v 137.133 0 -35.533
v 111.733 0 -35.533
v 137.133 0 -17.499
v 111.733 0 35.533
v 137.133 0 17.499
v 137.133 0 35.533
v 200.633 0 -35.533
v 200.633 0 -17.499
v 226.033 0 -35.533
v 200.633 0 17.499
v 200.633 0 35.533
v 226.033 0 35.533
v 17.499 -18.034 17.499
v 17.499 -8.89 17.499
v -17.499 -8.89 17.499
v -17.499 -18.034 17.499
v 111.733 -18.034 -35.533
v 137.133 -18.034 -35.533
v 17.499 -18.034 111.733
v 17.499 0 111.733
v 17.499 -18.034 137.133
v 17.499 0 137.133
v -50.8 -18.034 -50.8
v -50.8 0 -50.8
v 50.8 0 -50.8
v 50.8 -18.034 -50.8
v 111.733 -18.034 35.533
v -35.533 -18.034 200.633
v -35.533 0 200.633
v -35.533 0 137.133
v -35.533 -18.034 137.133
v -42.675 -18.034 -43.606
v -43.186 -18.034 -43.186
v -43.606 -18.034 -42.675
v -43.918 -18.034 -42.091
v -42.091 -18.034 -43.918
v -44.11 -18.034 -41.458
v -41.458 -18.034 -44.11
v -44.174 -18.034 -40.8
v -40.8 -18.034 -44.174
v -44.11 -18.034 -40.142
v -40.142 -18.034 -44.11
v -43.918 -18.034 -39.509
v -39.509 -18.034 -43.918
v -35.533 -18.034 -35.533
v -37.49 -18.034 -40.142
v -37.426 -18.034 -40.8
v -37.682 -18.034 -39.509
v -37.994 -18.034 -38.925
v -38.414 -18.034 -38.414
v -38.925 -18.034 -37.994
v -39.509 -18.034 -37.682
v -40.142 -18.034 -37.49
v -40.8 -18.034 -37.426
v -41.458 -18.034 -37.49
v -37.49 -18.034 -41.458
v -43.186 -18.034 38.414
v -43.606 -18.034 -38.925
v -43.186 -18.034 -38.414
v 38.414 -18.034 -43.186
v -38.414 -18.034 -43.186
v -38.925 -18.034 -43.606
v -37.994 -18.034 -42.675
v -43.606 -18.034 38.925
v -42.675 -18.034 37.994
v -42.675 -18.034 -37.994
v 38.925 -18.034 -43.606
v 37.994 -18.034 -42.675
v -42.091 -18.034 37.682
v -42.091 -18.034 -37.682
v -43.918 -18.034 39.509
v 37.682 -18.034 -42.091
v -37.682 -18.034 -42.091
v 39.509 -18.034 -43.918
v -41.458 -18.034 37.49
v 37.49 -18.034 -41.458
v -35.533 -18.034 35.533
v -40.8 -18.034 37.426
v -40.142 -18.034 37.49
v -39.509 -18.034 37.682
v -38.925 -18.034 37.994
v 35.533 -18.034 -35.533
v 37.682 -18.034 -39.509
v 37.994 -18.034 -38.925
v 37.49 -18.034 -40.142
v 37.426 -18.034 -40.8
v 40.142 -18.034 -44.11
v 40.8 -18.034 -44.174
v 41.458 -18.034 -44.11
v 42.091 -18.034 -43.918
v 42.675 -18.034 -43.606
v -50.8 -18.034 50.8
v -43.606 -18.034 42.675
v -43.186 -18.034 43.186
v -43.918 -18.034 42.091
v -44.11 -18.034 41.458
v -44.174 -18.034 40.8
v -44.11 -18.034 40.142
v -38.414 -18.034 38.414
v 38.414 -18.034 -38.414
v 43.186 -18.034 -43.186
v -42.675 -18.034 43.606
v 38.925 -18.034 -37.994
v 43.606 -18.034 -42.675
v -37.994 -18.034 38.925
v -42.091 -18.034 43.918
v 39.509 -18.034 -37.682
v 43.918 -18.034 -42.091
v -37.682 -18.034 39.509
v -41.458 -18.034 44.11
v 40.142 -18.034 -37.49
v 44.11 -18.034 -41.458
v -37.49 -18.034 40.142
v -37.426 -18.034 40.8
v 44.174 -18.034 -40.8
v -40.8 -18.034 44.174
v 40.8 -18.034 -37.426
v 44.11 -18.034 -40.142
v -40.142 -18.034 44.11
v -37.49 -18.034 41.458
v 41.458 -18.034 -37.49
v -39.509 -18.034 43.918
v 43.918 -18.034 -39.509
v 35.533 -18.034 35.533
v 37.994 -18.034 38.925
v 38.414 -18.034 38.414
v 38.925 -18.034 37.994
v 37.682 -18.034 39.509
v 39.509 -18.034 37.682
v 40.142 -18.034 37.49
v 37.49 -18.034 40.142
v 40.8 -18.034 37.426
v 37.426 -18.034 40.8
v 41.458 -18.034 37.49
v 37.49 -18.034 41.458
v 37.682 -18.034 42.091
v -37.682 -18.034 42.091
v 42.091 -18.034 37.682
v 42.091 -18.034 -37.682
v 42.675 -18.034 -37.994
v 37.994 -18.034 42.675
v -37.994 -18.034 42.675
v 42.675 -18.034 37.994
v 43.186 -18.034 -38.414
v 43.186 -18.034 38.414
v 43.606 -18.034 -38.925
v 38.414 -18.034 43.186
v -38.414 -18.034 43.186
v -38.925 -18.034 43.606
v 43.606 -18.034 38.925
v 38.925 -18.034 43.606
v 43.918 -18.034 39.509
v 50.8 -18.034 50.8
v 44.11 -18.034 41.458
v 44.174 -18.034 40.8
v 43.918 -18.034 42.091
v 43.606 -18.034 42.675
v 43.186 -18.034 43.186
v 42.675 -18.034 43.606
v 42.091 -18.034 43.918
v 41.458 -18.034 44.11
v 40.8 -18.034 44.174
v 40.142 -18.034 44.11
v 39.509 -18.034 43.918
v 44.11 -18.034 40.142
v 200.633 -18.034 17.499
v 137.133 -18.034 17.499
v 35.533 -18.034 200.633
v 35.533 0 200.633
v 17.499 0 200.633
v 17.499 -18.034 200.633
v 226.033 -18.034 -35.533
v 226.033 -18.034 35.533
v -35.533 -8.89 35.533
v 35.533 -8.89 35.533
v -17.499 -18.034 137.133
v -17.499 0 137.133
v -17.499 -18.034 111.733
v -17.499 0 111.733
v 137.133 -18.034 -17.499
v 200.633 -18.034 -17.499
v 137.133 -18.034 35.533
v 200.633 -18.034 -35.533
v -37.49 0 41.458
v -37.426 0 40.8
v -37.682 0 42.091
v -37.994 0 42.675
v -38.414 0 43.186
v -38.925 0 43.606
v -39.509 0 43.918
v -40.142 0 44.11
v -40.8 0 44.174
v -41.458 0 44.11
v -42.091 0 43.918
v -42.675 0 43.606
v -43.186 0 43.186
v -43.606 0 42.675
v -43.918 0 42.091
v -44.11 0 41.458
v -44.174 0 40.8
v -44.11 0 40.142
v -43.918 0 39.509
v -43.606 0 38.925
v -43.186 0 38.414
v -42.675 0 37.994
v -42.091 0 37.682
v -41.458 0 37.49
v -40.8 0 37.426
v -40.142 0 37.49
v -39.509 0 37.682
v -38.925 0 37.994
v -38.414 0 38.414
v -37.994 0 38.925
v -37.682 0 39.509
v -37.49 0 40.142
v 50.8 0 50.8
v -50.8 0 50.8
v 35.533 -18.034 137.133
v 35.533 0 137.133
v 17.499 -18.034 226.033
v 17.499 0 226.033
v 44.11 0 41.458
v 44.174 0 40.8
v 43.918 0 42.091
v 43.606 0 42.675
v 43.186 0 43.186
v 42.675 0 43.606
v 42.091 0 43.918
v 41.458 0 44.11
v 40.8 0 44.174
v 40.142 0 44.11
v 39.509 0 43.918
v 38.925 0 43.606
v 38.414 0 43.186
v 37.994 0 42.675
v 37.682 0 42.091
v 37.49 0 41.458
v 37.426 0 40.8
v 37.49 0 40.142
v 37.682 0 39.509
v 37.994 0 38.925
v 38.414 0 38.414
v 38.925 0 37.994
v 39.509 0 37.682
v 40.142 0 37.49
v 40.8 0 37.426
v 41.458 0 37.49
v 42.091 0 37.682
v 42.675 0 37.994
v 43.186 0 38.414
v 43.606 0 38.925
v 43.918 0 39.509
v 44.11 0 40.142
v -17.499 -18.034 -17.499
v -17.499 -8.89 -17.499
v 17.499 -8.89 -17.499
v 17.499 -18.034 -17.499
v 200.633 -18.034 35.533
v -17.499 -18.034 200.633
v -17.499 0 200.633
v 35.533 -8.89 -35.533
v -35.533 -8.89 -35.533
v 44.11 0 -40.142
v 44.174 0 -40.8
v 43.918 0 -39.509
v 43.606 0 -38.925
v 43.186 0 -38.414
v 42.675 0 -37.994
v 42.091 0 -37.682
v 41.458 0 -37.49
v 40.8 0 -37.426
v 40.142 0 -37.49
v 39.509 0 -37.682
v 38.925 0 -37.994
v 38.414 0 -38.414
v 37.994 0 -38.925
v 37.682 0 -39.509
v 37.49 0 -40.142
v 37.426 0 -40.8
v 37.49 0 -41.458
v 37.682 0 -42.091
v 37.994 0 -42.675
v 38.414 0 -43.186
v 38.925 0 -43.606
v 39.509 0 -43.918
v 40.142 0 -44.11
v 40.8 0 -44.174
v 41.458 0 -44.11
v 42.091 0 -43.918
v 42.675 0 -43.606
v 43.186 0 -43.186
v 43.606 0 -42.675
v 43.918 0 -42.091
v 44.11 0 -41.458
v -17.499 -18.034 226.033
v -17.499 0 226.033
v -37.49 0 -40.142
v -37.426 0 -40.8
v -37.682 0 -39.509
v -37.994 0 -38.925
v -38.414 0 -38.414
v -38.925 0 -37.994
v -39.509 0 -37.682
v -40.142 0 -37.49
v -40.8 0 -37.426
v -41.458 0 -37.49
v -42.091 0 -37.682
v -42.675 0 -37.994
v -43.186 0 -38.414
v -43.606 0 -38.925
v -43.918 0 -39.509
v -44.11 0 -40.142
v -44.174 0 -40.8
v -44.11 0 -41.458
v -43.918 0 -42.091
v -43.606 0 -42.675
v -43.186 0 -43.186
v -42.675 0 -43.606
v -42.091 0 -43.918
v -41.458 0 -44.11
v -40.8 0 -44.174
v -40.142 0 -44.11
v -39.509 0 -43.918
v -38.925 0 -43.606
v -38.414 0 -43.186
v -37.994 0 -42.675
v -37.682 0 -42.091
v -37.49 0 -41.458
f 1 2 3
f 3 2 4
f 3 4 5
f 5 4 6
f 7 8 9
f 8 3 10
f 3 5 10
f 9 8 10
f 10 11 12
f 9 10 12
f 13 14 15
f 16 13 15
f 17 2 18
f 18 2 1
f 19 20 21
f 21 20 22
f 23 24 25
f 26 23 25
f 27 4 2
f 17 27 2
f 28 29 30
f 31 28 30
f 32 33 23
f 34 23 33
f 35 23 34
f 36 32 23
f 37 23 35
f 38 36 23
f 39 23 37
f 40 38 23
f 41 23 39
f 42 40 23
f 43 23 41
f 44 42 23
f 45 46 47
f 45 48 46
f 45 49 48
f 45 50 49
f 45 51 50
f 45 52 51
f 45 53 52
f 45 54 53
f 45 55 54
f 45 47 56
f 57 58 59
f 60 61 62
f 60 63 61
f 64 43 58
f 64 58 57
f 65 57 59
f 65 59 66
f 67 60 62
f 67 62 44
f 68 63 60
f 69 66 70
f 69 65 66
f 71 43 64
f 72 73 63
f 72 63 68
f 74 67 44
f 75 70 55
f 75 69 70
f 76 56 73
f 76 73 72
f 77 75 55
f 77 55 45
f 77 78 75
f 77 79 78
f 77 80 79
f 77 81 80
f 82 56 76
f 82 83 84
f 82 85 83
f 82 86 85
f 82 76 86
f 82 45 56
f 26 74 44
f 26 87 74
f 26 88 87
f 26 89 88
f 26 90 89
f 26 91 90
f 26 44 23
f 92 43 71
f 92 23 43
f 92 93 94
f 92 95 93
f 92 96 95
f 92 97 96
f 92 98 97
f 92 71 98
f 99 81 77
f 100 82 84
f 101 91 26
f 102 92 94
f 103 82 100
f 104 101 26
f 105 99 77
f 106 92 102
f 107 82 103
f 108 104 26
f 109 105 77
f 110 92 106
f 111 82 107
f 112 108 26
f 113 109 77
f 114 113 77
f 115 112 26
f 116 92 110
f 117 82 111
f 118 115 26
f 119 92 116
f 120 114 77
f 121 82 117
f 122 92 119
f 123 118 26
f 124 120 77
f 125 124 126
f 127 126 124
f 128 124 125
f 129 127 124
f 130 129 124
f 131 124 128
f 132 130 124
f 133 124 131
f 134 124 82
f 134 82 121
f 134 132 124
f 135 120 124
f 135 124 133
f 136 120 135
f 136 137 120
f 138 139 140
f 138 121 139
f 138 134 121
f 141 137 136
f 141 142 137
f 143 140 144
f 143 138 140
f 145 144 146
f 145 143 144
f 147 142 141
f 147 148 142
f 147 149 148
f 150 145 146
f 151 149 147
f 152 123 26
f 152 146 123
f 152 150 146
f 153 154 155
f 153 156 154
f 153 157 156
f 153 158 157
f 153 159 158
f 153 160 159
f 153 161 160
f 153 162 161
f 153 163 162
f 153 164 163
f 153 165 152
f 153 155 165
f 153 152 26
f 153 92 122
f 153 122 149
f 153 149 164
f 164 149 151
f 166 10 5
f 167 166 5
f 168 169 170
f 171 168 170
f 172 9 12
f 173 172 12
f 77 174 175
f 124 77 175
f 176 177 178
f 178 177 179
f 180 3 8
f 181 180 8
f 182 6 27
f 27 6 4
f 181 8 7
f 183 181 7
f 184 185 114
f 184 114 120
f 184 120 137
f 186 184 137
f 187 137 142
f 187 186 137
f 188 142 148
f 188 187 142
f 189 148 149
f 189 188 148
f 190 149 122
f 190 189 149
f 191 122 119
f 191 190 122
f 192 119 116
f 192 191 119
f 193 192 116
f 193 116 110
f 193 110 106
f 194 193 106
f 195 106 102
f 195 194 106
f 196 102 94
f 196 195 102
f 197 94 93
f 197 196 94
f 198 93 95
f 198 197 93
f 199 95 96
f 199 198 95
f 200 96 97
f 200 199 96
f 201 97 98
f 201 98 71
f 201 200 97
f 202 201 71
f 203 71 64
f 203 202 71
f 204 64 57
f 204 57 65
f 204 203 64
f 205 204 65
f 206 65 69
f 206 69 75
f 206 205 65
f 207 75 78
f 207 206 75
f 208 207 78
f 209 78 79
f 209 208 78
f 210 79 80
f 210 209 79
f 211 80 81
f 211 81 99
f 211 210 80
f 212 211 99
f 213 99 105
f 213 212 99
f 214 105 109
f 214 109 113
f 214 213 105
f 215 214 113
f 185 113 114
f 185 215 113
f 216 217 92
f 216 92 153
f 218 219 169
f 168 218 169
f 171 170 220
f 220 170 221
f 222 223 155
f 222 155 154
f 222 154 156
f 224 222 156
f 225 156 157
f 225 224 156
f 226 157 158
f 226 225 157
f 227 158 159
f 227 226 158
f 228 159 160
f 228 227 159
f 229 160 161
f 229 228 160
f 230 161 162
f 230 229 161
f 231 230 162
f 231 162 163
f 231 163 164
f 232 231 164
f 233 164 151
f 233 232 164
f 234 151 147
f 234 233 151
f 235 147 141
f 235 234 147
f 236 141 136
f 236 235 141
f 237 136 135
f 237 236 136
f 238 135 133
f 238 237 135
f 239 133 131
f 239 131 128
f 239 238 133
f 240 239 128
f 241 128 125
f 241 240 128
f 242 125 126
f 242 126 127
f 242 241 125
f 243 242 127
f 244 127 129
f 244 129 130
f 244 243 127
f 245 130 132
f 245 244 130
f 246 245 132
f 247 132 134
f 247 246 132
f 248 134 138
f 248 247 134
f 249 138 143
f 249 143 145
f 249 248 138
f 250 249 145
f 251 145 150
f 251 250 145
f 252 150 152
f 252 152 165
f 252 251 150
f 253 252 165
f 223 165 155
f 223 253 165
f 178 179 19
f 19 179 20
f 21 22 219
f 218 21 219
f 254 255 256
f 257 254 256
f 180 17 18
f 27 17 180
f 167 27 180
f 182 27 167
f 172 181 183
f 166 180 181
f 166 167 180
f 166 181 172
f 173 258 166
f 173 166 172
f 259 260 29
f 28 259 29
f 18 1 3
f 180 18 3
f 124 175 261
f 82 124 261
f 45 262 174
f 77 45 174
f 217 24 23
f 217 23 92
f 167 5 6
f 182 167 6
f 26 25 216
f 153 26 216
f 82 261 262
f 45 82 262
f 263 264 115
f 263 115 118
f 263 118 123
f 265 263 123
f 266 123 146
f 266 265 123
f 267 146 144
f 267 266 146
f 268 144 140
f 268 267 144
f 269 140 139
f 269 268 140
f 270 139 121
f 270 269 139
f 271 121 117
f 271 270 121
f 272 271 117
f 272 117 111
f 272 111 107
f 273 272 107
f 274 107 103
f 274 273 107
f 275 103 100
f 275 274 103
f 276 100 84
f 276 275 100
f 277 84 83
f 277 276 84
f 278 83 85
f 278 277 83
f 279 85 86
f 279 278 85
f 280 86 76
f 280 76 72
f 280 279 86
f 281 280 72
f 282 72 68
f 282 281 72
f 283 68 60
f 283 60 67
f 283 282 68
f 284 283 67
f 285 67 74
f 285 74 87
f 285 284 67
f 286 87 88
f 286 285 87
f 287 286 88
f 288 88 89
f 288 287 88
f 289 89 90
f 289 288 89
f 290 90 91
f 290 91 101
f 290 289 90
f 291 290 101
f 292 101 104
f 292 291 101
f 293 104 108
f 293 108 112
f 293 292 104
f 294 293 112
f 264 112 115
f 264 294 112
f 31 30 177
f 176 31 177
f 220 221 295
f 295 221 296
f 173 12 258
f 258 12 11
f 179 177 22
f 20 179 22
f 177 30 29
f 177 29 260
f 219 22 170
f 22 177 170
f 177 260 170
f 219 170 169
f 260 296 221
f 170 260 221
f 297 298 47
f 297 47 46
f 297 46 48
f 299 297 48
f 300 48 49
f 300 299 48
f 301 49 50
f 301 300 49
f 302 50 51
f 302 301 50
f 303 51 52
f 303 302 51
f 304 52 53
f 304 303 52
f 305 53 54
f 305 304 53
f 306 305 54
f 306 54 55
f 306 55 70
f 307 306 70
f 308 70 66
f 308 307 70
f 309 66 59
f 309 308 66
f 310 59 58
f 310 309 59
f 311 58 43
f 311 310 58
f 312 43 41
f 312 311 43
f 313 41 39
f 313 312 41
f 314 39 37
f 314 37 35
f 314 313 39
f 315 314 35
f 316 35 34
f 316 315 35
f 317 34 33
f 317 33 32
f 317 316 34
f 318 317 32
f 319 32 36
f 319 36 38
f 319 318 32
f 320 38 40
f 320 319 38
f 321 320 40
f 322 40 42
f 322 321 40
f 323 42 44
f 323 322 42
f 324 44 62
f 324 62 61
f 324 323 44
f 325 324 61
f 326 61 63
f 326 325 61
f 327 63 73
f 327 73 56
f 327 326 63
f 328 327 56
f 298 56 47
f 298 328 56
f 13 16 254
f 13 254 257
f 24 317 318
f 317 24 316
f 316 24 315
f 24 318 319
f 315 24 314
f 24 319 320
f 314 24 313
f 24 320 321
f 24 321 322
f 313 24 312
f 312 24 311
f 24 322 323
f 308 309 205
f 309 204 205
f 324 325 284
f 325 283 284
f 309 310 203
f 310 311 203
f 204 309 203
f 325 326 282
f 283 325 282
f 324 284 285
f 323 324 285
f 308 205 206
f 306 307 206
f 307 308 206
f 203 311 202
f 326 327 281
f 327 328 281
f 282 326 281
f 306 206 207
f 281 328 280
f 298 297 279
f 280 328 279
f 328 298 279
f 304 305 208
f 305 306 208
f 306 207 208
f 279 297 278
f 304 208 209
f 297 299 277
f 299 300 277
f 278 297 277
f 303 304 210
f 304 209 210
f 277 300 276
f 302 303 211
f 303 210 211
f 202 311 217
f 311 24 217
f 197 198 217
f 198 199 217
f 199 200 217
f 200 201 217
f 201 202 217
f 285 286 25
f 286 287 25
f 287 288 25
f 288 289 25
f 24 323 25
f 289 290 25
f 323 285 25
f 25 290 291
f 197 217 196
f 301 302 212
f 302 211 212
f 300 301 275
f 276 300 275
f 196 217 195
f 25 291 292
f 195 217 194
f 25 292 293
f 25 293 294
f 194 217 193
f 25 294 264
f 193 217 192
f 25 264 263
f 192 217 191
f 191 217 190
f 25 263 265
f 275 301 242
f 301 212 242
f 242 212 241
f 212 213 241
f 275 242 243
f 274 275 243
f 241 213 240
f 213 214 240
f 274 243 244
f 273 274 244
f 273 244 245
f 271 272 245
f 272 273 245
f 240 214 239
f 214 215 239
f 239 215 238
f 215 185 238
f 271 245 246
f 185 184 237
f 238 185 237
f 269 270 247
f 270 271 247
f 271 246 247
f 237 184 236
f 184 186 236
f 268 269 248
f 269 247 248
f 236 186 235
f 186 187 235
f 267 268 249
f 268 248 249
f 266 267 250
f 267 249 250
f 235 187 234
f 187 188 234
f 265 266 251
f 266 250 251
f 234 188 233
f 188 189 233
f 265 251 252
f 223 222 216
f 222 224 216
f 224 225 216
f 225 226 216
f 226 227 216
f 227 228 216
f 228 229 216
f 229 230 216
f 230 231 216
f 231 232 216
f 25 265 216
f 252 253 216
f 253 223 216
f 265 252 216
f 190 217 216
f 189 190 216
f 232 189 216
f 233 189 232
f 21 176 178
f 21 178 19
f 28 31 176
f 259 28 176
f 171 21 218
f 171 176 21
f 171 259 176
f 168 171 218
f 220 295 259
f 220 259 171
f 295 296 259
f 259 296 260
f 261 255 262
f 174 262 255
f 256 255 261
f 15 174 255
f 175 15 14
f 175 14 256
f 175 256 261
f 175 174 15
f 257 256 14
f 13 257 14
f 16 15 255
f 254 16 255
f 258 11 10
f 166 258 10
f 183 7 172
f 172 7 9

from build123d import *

# Parameters (mm, degrees)
F1_DEPTH = 18.034
F0_W     = 101.6
F0_H     = 101.6
F0_R     = 3.37439
F2_DEPTH = 8.89


# Not quite as in the source:
# - a feature names something its author has since deleted; it is built from what else it names


with BuildPart() as f1:
    # F0 (on Front) → F1 (new body)
    with BuildSketch(Plane.XZ):
        Polygon((-17.49933, 137.13333), (-17.49933, 111.73333), (17.49933, 111.73333), (17.49933, 137.13333), (35.53333, 137.13333), (35.53333, 200.63333), (17.49933, 200.63333), (17.49933, 226.03333), (-17.49933, 226.03333), (-17.49933, 200.63333), (-35.53333, 200.63333), (-35.53333, 137.13333), align=None)
    extrude(amount=F1_DEPTH)


with BuildPart() as f1b:
    # F0 (on Front) → F1, piece 2 (new body)
    with BuildSketch(Plane.XZ):
        Rectangle(F0_W, F0_H)
        with Locations((-40.80002, -40.80002)):
            Circle(F0_R, mode=Mode.SUBTRACT)
        with Locations((-40.80002, 40.80002)):
            Circle(F0_R, mode=Mode.SUBTRACT)
        with Locations((40.80002, -40.80002)):
            Circle(F0_R, mode=Mode.SUBTRACT)
        Polygon((35.53333, 35.53333), (35.53333, 17.49933), (35.53333, -17.49933), (35.53333, -35.53333), (-35.53333, -35.53333), (-35.53333, -17.49933), (-35.53333, 17.49933), (-35.53333, 35.53333), align=None, mode=Mode.SUBTRACT)
        with Locations((40.80002, 40.80002)):
            Circle(F0_R, mode=Mode.SUBTRACT)
    extrude(amount=F1_DEPTH)



with BuildPart() as f1c:
    # F0 (on Front) → F1, piece 3 (new body)
    with BuildSketch(Plane.XZ):
        with BuildLine():
            ThreePointArc((5.04e-08, 17.49933), (12.373894927, 12.3738948914), (17.49933, 0))
            Line((17.49933, 0), (17.49933, 17.49933))
            Line((17.49933, 17.49933), (5.04e-08, 17.49933))
        make_face()
        with BuildLine():
            ThreePointArc((-17.49933, 1.35e-08), (-12.3738948866, 12.3738949318), (5.04e-08, 17.49933))
            Line((5.04e-08, 17.49933), (-17.49933, 17.49933))
            Line((-17.49933, 17.49933), (-17.49933, 1.35e-08))
        make_face()
        with BuildLine():
            ThreePointArc((1.06e-08, -17.49933), (12.373894913, -12.3738949055), (17.49933, 0))
            ThreePointArc((17.49933, 0), (12.373894927, 12.3738948914), (5.04e-08, 17.49933))
            ThreePointArc((5.04e-08, 17.49933), (-12.3738948866, 12.3738949318), (-17.49933, 1.35e-08))
            ThreePointArc((-17.49933, 1.35e-08), (-12.3738949102, -12.3738949082), (1.06e-08, -17.49933))
        make_face()
        with BuildLine():
            Line((-17.49933, -17.49933), (1.06e-08, -17.49933))
            ThreePointArc((1.06e-08, -17.49933), (-12.3738949102, -12.3738949082), (-17.49933, 1.35e-08))
            Line((-17.49933, 1.35e-08), (-17.49933, -17.49933))
        make_face()
        with BuildLine():
            Line((17.49933, -17.49933), (17.49933, 0))
            ThreePointArc((17.49933, 0), (12.373894913, -12.3738949055), (1.06e-08, -17.49933))
            Line((1.06e-08, -17.49933), (17.49933, -17.49933))
        make_face()
    extrude(amount=F1_DEPTH)


with BuildPart() as f1d:
    # F0 (on Front) → F1, piece 4 (new body)
    with BuildSketch(Plane.XZ):
        Polygon((137.13333, 35.53333), (111.73333, 35.53333), (111.73333, -35.53333), (137.13333, -35.53333), (137.13333, -17.49933), (200.63333, -17.49933), (200.63333, -35.53333), (226.03333, -35.53333), (226.03333, 35.53333), (200.63333, 35.53333), (200.63333, 17.49933), (137.13333, 17.49933), align=None)
    extrude(amount=F1_DEPTH)


with BuildPart() as f1b_1:
    add(f1b.part)

    add(f1c.part)  # F2 merges F1c
    # F0 (on Front) → F2 (join)
    with BuildSketch(Plane.XZ):
        Polygon((-17.49933, 17.49933), (5.04e-08, 17.49933), (17.49933, 17.49933), (35.53333, 17.49933), (35.53333, 35.53333), (-35.53333, 35.53333), (-35.53333, 17.49933), align=None)
        Polygon((-17.49933, -17.49933), (-17.49933, 1.35e-08), (-17.49933, 17.49933), (-35.53333, 17.49933), (-35.53333, -17.49933), align=None)
        Polygon((17.49933, -17.49933), (1.06e-08, -17.49933), (-17.49933, -17.49933), (-35.53333, -17.49933), (-35.53333, -35.53333), (35.53333, -35.53333), (35.53333, -17.49933), align=None)
        Polygon((17.49933, 17.49933), (17.49933, 0), (17.49933, -17.49933), (35.53333, -17.49933), (35.53333, 17.49933), align=None)
    extrude(amount=F2_DEPTH)


solid = Compound([f1.part, f1d.part, f1b_1.part])
